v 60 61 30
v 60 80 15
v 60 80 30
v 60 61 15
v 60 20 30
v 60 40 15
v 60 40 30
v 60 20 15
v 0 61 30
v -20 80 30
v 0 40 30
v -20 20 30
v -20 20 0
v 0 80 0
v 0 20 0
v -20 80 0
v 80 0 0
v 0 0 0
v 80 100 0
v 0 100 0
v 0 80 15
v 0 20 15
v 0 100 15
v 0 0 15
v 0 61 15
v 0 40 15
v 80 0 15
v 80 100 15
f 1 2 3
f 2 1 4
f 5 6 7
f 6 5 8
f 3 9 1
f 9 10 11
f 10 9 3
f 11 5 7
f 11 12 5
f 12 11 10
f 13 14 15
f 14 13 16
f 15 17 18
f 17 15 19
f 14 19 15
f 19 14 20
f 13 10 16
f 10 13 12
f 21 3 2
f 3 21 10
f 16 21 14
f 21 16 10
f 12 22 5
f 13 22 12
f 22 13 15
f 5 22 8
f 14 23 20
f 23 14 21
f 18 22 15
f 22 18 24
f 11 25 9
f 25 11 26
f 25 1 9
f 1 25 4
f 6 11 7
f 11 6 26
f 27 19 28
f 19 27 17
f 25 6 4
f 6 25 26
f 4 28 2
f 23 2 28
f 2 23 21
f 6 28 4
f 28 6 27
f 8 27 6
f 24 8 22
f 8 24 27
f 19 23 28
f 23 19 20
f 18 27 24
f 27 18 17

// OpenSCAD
// Logo du Club Micro
// Lettre C dans le M
// 2016 - FRA
// Et un jour peut-etre notre Super Micro ... :D

echo(version=version());

y=100; // Largeur lettre M

ll=y/5; // Largeur de trait des lettres
x=y-ll;  // Longueur lettre M
z=15;  // Epaisseur lettre M

union() {
  // Le M bleu
  color("blue")
  cube([x, y, z]);

  // Le C orange
  difference() {
    color("orange")
    translate([-ll, ll, 0])
    cube([x, y-2*ll , z*2]);
    
    translate([0, 2*ll, 0])
    cube([x-ll+1, ll+1, z*2+1]);
  }
}

